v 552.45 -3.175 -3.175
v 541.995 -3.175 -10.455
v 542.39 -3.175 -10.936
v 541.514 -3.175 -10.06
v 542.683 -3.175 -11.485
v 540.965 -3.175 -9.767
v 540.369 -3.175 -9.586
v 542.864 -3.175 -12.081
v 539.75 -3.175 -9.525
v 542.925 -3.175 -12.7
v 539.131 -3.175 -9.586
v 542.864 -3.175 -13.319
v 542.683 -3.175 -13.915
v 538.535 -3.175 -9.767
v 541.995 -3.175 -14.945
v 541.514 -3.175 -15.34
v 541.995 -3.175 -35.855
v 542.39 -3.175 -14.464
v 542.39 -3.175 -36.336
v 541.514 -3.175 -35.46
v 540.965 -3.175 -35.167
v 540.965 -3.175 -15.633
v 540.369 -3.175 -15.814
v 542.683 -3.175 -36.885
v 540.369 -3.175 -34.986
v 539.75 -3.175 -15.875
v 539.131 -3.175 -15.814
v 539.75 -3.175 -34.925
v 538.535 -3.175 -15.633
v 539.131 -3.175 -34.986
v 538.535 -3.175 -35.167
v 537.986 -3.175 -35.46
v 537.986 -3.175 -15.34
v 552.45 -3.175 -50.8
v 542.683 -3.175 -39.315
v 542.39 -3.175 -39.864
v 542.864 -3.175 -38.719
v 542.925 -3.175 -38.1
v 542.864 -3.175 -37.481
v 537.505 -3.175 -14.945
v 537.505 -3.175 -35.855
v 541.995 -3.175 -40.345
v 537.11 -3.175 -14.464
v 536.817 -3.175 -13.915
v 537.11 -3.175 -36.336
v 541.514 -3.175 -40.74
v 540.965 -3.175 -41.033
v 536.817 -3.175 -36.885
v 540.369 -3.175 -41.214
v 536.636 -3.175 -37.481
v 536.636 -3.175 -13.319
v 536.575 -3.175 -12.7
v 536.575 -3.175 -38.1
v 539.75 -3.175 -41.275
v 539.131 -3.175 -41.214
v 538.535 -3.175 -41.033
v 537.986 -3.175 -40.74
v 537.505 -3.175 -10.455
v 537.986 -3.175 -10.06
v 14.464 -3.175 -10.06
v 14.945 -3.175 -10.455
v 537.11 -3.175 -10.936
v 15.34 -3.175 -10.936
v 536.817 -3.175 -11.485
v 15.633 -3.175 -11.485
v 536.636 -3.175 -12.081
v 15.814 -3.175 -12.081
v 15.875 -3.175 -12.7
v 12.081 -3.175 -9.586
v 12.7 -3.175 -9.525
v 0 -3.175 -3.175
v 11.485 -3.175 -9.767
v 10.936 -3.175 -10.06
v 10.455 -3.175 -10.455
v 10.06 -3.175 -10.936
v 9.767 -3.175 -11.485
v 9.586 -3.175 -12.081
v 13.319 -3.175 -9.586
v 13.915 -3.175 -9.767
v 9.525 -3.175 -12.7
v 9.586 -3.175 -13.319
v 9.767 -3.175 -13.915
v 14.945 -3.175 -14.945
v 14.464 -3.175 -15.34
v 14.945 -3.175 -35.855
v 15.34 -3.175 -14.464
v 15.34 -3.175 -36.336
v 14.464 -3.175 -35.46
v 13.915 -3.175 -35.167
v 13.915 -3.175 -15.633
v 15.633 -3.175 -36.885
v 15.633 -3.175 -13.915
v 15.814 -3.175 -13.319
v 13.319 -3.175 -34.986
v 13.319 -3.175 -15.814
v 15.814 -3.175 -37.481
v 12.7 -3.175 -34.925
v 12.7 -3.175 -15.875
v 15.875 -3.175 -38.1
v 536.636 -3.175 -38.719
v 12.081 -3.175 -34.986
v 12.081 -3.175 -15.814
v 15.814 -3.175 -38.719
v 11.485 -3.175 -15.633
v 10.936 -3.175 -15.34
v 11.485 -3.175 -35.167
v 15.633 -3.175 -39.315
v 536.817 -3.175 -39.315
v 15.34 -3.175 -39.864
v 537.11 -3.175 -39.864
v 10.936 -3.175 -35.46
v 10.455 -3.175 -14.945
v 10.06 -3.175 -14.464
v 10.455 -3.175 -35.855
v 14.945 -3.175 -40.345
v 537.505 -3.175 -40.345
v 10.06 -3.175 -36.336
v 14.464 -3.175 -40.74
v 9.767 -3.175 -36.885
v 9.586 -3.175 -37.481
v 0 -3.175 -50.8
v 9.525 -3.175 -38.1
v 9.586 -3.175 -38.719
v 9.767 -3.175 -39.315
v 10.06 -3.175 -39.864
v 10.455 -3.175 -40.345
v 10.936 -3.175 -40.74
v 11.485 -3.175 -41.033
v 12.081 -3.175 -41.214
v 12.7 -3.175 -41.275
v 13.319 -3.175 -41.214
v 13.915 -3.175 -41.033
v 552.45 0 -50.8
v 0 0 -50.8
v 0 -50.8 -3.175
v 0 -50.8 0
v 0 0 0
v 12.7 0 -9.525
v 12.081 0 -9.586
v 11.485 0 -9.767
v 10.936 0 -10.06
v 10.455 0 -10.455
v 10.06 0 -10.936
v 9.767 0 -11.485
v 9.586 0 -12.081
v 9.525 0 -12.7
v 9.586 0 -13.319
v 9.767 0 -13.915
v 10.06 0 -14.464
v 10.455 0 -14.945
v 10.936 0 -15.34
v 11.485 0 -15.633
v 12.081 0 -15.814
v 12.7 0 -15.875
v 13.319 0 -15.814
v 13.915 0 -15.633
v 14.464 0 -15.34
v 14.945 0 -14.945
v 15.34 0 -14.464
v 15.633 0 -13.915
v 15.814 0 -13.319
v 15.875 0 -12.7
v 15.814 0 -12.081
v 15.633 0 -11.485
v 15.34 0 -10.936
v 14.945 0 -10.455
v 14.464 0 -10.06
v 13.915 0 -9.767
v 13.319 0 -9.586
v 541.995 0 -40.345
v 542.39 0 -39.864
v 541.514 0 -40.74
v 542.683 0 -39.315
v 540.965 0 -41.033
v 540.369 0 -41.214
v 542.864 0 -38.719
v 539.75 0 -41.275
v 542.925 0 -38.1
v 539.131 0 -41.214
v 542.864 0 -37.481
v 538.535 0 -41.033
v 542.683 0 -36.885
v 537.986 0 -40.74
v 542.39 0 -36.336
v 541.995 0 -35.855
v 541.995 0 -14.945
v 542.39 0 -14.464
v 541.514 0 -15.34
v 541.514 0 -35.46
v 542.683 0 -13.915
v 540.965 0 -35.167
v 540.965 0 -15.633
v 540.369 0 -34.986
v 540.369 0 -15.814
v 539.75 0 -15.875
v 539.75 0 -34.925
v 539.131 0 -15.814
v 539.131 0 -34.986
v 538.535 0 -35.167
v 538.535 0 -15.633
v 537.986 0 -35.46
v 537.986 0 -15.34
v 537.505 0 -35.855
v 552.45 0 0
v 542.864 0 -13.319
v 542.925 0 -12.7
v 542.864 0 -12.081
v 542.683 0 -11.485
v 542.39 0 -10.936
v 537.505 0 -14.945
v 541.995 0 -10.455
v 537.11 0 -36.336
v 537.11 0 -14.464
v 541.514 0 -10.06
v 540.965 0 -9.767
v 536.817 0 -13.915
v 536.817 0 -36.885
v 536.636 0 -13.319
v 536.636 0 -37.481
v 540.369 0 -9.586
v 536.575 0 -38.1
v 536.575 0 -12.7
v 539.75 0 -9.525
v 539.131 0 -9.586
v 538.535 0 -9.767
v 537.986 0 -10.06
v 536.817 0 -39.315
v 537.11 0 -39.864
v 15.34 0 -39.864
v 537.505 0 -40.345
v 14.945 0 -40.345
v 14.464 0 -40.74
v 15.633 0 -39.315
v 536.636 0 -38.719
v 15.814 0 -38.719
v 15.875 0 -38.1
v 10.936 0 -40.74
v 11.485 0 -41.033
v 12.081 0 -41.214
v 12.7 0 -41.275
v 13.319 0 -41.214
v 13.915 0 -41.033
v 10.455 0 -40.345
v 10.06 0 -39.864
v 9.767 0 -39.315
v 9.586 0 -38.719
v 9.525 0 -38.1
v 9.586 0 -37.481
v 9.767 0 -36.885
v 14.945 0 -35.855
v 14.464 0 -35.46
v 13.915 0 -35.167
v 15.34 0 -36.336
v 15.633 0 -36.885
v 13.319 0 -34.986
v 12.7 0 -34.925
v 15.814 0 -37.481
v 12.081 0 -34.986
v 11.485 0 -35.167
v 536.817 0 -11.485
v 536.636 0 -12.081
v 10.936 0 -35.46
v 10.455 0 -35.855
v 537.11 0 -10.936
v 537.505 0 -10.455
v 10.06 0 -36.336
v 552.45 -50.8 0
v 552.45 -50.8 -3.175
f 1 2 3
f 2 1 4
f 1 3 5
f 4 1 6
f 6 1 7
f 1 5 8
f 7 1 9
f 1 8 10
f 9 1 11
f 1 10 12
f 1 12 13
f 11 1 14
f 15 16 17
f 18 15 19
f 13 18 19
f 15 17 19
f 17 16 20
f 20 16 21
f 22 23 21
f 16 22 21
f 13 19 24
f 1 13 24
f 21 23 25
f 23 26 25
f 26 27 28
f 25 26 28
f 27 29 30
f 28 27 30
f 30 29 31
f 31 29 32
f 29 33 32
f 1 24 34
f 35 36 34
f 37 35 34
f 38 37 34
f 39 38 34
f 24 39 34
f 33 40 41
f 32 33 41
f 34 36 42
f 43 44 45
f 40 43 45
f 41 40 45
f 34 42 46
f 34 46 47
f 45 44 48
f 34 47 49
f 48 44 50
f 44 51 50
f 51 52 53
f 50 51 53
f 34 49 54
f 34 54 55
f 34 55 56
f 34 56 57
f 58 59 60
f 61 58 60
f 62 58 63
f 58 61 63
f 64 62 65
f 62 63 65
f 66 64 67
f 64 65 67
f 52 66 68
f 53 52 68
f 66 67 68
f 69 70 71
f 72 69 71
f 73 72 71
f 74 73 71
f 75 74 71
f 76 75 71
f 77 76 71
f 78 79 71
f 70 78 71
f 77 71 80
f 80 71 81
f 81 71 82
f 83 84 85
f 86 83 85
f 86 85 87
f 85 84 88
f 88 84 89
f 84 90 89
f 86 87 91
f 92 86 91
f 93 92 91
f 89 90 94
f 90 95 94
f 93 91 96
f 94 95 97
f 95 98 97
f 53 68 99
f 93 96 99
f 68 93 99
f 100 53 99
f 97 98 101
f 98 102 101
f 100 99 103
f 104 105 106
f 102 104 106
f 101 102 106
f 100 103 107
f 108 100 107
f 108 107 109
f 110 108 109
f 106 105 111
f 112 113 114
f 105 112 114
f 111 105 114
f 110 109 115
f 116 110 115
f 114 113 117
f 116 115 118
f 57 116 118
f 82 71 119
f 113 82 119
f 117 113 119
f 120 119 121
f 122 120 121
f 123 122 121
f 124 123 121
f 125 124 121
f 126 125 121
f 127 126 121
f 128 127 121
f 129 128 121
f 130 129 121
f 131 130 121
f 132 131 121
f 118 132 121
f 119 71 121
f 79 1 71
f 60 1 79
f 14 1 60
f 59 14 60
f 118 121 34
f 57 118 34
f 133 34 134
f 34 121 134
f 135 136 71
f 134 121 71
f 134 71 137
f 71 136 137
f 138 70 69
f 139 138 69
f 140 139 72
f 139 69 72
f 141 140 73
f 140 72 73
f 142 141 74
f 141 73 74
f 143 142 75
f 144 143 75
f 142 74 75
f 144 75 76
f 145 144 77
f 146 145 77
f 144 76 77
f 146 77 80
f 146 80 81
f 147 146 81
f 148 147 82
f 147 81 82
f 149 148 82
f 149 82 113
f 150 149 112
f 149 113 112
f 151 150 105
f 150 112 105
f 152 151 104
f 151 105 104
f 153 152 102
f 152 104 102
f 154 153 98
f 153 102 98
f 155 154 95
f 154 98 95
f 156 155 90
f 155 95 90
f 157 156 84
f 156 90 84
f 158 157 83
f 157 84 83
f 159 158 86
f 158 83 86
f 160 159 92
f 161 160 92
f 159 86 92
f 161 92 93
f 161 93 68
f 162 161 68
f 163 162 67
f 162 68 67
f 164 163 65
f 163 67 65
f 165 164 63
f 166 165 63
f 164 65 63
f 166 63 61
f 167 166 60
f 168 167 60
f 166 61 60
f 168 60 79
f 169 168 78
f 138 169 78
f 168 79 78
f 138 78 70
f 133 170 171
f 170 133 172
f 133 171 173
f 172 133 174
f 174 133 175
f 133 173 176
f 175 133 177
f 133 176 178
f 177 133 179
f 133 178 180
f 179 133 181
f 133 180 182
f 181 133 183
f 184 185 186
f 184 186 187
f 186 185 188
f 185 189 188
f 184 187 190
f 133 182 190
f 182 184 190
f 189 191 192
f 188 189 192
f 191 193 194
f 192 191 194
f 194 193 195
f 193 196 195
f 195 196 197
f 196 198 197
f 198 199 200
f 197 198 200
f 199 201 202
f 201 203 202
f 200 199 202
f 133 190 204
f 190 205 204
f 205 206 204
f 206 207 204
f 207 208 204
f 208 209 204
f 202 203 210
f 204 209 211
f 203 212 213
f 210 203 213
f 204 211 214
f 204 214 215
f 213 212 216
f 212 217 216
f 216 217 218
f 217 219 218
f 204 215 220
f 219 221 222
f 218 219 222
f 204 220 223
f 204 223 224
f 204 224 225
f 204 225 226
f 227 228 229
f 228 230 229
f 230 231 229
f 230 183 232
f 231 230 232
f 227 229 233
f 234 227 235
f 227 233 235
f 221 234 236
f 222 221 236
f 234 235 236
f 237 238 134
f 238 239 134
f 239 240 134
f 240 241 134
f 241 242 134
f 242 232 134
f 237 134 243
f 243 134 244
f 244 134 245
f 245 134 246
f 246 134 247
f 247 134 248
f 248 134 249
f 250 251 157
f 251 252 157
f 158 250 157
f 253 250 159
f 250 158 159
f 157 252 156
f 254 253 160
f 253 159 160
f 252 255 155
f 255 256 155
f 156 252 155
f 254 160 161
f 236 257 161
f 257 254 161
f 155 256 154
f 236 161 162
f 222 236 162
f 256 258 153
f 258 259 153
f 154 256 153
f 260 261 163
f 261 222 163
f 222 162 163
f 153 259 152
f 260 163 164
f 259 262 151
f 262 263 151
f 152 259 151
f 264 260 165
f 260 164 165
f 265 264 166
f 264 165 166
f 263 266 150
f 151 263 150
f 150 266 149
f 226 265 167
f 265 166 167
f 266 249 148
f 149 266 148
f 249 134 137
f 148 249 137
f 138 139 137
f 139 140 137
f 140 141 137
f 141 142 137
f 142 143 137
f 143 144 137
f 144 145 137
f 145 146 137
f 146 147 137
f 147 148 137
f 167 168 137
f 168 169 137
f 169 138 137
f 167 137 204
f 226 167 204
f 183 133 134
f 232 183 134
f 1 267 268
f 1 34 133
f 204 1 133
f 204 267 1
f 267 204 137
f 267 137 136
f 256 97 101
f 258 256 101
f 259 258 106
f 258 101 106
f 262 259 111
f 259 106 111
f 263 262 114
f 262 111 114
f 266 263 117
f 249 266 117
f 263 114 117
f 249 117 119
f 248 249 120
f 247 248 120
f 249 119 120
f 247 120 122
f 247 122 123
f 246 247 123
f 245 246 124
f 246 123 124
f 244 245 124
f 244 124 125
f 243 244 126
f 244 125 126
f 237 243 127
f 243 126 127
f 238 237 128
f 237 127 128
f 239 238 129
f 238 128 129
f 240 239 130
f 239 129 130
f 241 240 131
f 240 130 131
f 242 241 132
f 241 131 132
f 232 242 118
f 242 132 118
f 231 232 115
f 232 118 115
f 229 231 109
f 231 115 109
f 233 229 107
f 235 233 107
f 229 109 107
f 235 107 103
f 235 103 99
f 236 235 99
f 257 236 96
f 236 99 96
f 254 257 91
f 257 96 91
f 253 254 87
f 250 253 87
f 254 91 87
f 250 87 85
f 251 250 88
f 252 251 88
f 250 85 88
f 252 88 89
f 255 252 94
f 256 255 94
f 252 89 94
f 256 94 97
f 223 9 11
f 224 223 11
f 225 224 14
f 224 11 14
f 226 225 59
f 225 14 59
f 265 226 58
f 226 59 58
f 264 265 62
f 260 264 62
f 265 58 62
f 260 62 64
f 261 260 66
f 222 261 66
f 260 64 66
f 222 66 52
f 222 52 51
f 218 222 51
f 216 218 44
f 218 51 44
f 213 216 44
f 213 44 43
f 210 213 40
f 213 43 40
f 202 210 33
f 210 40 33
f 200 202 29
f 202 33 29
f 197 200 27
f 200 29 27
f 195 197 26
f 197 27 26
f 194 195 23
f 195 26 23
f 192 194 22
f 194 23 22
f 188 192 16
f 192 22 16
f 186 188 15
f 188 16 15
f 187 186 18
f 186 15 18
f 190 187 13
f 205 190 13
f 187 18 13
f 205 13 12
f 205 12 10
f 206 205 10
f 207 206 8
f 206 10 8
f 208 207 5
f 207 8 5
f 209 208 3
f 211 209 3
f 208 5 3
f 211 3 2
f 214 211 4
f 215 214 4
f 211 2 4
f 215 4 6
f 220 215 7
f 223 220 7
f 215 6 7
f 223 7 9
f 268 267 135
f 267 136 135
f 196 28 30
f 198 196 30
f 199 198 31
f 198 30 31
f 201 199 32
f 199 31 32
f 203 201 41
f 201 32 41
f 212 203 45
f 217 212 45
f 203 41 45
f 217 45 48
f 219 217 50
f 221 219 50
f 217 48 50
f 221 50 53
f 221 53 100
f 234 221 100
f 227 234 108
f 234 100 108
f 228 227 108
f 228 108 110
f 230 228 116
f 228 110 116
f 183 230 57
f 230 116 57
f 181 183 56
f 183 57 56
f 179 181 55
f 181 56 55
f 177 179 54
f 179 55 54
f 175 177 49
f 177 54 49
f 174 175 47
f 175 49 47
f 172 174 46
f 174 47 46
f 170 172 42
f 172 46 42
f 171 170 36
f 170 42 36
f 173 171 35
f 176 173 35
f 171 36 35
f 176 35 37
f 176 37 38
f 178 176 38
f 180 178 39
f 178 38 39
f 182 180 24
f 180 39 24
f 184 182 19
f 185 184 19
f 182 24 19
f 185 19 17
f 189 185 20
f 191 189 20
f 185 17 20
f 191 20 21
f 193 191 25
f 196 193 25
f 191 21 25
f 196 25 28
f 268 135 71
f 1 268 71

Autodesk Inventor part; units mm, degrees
ref_plane "YZ Plane" through (0, 0, 0) normal (1, 0, 0) x (0, 1, 0)
ref_plane "XZ Plane" through (0, 0, 0) normal (0, 1, 0) x (-1, 0, 0)
ref_plane "XY Plane" through (0, 0, 0) normal (0, 0, 1) x (1, 0, 0)
sketch "Sketch1" plane through (0, 0, 0) normal (1, 0, 0) x (0, 1, 0)
  line L0 (0, 0) -> (-50.8, 0)
  line L1 (-50.8, 0) -> (-50.8, -3.175)
  line L2 (-50.8, -3.175) -> (0, -3.175)
  line L3 (0, -3.175) -> (0, 0)
  line L4 (0, 0) -> (-3.175, 0)
  line L5 (-3.175, 0) -> (-3.175, -50.8)
  line L6 (-3.175, -50.8) -> (0, -50.8)
  line L7 (0, -50.8) -> (0, 0)
  dimension "d0" = 50.8
  dimension "d1" = 3.175
  dimension "d2" = 3.175
  dimension "d3" = 50.8
extrude "Extrusion1" add sketch "Sketch1" along normal blind 552.45
sketch "Sketch2" plane through (0, 0, 0) normal (0, 1, 0) x (1, 0, 0)
  line L0 (0, 50.8) -> (0, 0) projected
  line L1 (0, 0) -> (552.45, 0) projected
  line L2 (552.45, 50.8) -> (552.45, 0) projected
  line L3 (0, 50.8) -> (552.45, 50.8) projected
  point P0 (12.7, 12.7)
  point P1 (12.7, 38.1)
  point P2 (539.75, 12.7)
  point P3 (539.75, 38.1)
  dimension "d6" = 12.7
  dimension "d7" = 12.7
  dimension "d8" = 12.7
  dimension "d9" = 12.7
  dimension "d10" = 12.7
  dimension "d11" = 12.7
  dimension "d12" = 12.7
  dimension "d13" = 12.7
hole "Hole1" at (12.7, 0, -12.7) at (12.7, 0, -38.1) at (539.75, 0, -12.7) at (539.75, 0, -38.1) direction (0, -1, 0) diameter 6.35 end through all
properties part number "2x2 angle support"
